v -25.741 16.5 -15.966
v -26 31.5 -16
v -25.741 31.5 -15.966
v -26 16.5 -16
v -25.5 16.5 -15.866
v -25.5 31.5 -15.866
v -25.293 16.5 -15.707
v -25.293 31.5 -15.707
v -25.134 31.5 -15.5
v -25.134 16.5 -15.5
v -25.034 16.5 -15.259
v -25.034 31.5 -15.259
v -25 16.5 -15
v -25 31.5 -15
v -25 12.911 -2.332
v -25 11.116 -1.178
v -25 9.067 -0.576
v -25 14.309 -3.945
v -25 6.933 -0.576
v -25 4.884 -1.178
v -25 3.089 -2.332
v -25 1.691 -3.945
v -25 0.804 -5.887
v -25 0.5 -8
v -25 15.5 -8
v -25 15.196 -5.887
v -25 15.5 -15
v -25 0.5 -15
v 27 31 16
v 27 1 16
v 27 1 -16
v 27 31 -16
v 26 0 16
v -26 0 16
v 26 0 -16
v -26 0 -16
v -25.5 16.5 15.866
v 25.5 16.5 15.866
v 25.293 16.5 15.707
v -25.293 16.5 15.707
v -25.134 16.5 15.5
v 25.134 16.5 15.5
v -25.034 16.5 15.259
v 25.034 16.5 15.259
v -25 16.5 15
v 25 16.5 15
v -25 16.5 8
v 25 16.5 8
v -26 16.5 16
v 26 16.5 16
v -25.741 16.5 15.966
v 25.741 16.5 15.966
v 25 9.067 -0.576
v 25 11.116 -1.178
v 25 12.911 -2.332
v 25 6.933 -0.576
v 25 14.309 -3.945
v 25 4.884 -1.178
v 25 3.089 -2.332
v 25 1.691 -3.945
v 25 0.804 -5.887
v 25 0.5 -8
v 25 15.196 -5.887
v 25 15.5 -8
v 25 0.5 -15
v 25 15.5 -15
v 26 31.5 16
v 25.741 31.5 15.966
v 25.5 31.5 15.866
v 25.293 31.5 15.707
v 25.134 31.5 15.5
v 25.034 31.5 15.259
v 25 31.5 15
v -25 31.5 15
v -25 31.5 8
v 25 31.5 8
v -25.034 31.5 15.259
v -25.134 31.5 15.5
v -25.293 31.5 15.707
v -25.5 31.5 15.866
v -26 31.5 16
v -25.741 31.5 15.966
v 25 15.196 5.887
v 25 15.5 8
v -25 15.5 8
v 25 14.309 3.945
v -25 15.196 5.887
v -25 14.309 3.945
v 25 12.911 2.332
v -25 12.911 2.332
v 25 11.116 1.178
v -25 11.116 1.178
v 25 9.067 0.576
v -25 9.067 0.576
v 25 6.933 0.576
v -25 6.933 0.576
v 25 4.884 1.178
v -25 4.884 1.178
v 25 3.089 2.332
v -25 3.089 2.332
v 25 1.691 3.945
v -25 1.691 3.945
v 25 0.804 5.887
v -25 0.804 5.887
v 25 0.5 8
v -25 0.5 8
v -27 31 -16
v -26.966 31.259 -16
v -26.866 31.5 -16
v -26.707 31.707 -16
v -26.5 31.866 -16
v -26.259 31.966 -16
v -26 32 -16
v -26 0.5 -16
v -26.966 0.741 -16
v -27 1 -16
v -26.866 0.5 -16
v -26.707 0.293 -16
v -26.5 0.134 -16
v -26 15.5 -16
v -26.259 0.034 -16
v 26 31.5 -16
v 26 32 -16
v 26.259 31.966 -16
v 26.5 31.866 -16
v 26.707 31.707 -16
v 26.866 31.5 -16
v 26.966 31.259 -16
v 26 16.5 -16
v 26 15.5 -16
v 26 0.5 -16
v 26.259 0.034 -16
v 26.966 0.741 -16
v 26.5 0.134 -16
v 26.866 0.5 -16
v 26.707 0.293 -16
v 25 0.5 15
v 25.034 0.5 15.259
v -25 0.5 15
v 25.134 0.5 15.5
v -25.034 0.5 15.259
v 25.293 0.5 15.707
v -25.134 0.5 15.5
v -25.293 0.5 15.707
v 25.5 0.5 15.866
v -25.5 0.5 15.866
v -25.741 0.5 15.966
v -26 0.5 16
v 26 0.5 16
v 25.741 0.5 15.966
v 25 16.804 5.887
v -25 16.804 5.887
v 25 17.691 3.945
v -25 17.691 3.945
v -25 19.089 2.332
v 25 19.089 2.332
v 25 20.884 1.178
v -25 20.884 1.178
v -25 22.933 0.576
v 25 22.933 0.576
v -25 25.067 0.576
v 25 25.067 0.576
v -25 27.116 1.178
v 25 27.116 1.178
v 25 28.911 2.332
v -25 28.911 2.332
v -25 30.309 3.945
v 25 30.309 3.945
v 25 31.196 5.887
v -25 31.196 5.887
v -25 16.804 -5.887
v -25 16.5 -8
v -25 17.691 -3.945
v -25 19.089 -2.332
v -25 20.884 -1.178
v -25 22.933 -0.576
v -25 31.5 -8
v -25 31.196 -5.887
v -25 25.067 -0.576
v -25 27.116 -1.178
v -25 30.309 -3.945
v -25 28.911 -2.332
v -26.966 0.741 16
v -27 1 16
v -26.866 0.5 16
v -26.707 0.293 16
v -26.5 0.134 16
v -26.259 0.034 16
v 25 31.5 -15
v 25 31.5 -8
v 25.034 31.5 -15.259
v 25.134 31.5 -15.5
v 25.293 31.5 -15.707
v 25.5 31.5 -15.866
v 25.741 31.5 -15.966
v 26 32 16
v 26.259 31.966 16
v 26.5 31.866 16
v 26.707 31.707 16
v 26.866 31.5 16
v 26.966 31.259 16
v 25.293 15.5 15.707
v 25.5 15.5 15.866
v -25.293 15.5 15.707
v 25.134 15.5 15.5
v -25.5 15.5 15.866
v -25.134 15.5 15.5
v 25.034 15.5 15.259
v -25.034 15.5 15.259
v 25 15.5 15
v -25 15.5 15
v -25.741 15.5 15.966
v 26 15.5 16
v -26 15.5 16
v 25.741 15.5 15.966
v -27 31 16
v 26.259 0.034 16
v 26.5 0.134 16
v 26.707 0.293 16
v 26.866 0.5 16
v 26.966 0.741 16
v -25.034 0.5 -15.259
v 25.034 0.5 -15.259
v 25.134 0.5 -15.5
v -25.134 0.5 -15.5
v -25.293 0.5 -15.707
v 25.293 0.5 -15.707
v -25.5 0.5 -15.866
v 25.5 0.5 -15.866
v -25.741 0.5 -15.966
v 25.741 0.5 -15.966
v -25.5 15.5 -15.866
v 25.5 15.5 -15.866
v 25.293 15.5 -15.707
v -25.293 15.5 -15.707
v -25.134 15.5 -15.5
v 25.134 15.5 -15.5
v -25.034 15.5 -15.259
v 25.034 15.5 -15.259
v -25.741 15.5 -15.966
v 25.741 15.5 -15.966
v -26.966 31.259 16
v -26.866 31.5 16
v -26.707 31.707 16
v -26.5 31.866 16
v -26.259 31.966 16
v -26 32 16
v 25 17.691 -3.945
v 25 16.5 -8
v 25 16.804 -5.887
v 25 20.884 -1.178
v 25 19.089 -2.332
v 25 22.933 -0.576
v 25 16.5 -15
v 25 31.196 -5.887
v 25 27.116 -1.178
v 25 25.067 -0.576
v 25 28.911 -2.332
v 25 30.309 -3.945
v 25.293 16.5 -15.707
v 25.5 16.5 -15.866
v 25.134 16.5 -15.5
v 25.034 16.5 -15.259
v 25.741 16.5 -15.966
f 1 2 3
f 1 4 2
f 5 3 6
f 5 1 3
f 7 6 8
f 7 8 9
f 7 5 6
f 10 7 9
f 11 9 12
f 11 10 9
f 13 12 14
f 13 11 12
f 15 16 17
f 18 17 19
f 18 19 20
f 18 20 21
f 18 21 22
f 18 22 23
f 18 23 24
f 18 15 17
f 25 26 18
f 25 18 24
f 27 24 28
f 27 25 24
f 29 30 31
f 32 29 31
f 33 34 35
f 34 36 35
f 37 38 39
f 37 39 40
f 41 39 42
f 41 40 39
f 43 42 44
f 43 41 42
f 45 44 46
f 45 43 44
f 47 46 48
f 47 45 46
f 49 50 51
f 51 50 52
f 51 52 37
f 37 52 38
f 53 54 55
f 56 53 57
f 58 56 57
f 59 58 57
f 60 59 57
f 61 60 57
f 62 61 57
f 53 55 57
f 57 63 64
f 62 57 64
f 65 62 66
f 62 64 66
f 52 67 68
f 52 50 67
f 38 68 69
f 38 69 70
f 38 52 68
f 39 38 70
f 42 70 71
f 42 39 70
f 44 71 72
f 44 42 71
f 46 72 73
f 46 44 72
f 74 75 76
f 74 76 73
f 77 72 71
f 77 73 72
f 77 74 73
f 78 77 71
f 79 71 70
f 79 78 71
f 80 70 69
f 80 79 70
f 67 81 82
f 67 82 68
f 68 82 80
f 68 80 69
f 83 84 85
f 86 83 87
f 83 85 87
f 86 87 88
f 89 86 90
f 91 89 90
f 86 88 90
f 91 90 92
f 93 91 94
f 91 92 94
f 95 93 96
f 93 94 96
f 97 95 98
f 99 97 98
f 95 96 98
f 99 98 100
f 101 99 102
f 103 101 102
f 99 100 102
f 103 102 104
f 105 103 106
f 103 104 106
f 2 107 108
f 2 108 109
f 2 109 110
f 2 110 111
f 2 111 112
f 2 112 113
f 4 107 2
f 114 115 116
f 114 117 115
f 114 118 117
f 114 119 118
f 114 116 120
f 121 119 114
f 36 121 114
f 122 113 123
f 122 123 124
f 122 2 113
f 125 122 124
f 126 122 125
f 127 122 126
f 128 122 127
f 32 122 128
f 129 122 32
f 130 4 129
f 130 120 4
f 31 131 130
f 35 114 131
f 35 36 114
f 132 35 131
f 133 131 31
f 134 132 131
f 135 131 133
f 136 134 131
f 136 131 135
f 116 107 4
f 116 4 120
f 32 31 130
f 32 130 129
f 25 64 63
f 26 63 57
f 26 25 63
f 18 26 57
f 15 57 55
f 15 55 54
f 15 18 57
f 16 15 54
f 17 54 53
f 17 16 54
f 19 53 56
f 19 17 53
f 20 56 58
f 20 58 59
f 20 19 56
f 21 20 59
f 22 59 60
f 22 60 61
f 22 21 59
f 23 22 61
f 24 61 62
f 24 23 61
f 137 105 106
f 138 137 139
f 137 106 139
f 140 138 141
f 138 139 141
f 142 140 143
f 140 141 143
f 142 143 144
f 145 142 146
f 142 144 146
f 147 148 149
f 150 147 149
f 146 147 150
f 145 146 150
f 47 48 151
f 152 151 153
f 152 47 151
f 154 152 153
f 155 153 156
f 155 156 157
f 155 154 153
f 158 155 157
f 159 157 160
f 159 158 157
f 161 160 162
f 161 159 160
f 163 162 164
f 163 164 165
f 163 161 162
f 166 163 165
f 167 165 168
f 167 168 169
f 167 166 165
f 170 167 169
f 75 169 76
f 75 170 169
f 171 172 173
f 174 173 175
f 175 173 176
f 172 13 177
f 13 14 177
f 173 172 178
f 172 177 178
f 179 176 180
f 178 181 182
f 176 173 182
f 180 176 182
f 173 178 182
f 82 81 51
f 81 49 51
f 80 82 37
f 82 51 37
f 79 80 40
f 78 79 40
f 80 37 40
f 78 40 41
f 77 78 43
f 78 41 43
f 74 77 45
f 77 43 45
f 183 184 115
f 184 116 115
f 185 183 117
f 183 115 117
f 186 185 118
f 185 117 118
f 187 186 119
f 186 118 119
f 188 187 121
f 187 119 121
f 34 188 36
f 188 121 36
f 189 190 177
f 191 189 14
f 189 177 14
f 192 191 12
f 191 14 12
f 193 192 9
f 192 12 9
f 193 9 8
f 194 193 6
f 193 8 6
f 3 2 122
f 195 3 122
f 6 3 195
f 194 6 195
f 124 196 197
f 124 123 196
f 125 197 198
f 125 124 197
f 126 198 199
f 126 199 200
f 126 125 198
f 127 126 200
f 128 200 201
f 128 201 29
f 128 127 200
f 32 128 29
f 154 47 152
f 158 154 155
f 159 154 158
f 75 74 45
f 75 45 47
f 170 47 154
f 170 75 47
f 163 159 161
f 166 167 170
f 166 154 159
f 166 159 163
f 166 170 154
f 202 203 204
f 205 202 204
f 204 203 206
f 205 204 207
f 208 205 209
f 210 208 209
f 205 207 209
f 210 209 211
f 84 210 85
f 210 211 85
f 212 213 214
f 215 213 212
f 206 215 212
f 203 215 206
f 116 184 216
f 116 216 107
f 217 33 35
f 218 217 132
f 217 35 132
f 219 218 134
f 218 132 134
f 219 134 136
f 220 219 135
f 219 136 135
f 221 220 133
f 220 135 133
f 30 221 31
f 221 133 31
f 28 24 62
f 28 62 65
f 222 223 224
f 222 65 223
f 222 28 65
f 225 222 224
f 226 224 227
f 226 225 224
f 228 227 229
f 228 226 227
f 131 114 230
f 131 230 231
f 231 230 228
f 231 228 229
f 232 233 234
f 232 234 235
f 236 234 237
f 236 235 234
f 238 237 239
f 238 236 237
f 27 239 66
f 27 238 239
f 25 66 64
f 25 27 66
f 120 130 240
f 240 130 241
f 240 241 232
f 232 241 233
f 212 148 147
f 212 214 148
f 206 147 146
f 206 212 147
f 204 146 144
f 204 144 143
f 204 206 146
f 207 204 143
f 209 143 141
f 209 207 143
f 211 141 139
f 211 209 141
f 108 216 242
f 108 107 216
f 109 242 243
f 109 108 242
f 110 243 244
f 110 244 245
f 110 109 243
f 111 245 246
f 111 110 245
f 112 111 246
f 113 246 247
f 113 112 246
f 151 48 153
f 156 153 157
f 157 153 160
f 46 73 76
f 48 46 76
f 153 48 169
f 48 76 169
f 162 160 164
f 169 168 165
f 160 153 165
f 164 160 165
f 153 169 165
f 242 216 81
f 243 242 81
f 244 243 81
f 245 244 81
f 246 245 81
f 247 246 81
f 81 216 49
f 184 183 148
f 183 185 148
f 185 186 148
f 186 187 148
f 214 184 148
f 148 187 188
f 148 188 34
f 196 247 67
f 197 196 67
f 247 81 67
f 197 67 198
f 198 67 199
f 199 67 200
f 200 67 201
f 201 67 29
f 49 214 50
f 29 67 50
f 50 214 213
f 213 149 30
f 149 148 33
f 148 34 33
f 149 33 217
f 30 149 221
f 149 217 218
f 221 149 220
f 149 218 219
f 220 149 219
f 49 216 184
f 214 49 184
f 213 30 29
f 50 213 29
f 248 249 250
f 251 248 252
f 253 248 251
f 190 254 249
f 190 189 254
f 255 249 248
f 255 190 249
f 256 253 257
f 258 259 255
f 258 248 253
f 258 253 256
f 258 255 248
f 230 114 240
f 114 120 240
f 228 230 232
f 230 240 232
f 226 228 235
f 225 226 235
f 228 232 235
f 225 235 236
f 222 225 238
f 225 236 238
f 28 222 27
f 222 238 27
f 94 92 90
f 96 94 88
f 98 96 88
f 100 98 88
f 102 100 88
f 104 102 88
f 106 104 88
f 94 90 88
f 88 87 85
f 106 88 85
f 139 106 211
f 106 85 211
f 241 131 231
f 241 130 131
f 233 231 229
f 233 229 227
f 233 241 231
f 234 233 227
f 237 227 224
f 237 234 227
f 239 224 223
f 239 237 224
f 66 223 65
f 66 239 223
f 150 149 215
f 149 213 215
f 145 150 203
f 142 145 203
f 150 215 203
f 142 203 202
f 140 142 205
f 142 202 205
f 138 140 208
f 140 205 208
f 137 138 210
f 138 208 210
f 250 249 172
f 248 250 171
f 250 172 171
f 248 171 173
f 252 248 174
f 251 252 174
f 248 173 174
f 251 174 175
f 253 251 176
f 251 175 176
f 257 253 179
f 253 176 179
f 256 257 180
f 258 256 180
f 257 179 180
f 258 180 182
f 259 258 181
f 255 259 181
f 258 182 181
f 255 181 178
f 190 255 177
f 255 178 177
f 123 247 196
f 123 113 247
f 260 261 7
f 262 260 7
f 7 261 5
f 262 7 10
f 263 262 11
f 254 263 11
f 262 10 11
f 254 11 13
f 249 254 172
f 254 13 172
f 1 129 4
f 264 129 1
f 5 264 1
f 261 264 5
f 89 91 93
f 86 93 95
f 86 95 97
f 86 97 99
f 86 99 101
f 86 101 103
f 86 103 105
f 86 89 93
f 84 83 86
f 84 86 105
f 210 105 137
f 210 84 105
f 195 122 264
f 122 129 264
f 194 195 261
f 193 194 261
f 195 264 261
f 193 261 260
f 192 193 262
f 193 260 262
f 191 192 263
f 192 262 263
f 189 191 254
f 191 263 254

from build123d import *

# Parameters (mm, degrees)
SKETCH1_W               = 54
SKETCH1_H               = 32
BOSS_EXTRUDE1_DEPTH     = 32
CUT_EXTRUDE1_DEPTH      = 25
CUT_EXTRUDE1_DEPTH_BACK = 25
FILLET1_R               = 1


with BuildPart() as part:
    # Sketch1 → Boss-Extrude1 (new body)
    with BuildSketch(Plane(origin=(0, 0, 0), x_dir=(1, 0, 0), z_dir=(0, 1, 0))):
        Rectangle(SKETCH1_W, SKETCH1_H)
    extrude(amount=BOSS_EXTRUDE1_DEPTH)

    # Sketch2 → Cut-Extrude1 (cut, two sides: drawn at the far end of the back side and taken through both)
    with BuildSketch(Plane(origin=(0, 0, 0), x_dir=(0, 0, -1), z_dir=(1, 0, 0)).offset(-CUT_EXTRUDE1_DEPTH_BACK)):
        with BuildLine():
            Line((-8, 31.5), (-16, 31.5))
            Line((-16, 31.5), (-16, 16.5))
            Line((-16, 16.5), (-8, 16.5))
            ThreePointArc((-8, 16.5), (-0.5, 24), (-8, 31.5))
        make_face()
        with BuildLine():
            Line((16, 16.5), (8, 16.5))
            ThreePointArc((8, 16.5), (0.5, 24), (8, 31.5))
            Line((8, 31.5), (16, 31.5))
            Line((16, 31.5), (16, 16.5))
        make_face()
        with BuildLine():
            Line((16, 0.5), (16, 15.5))
            Line((16, 15.5), (8, 15.5))
            ThreePointArc((8, 15.5), (0.5, 8), (8, 0.5))
            Line((8, 0.5), (16, 0.5))
        make_face()
        with BuildLine():
            Line((-16, 15.5), (-8, 15.5))
            ThreePointArc((-8, 15.5), (-0.5, 8), (-8, 0.5))
            Line((-8, 0.5), (-16, 0.5))
            Line((-16, 0.5), (-16, 15.5))
        make_face()
    extrude(amount=CUT_EXTRUDE1_DEPTH + CUT_EXTRUDE1_DEPTH_BACK, mode=Mode.SUBTRACT)

    # Fillet1
    fillet1_edges = [part.edges().sort_by_distance(p)[0] for p in [
        (27, 32, 0),
        (-25, 24, -16),
        (25, 24, -16),
        (-25, 8, -16),
        (25, 8, -16),
        (-25, 24, 16),
        (25, 24, 16),
        (-27, 32, 0),
        (-25, 8, 16),
        (27, 0, 0),
        (25, 8, 16),
        (-27, 0, 0),
    ]]
    fillet(fillet1_edges, radius=FILLET1_R - 0.0001)  # a hair under: the kernel refuses the full size


solid = part.part
